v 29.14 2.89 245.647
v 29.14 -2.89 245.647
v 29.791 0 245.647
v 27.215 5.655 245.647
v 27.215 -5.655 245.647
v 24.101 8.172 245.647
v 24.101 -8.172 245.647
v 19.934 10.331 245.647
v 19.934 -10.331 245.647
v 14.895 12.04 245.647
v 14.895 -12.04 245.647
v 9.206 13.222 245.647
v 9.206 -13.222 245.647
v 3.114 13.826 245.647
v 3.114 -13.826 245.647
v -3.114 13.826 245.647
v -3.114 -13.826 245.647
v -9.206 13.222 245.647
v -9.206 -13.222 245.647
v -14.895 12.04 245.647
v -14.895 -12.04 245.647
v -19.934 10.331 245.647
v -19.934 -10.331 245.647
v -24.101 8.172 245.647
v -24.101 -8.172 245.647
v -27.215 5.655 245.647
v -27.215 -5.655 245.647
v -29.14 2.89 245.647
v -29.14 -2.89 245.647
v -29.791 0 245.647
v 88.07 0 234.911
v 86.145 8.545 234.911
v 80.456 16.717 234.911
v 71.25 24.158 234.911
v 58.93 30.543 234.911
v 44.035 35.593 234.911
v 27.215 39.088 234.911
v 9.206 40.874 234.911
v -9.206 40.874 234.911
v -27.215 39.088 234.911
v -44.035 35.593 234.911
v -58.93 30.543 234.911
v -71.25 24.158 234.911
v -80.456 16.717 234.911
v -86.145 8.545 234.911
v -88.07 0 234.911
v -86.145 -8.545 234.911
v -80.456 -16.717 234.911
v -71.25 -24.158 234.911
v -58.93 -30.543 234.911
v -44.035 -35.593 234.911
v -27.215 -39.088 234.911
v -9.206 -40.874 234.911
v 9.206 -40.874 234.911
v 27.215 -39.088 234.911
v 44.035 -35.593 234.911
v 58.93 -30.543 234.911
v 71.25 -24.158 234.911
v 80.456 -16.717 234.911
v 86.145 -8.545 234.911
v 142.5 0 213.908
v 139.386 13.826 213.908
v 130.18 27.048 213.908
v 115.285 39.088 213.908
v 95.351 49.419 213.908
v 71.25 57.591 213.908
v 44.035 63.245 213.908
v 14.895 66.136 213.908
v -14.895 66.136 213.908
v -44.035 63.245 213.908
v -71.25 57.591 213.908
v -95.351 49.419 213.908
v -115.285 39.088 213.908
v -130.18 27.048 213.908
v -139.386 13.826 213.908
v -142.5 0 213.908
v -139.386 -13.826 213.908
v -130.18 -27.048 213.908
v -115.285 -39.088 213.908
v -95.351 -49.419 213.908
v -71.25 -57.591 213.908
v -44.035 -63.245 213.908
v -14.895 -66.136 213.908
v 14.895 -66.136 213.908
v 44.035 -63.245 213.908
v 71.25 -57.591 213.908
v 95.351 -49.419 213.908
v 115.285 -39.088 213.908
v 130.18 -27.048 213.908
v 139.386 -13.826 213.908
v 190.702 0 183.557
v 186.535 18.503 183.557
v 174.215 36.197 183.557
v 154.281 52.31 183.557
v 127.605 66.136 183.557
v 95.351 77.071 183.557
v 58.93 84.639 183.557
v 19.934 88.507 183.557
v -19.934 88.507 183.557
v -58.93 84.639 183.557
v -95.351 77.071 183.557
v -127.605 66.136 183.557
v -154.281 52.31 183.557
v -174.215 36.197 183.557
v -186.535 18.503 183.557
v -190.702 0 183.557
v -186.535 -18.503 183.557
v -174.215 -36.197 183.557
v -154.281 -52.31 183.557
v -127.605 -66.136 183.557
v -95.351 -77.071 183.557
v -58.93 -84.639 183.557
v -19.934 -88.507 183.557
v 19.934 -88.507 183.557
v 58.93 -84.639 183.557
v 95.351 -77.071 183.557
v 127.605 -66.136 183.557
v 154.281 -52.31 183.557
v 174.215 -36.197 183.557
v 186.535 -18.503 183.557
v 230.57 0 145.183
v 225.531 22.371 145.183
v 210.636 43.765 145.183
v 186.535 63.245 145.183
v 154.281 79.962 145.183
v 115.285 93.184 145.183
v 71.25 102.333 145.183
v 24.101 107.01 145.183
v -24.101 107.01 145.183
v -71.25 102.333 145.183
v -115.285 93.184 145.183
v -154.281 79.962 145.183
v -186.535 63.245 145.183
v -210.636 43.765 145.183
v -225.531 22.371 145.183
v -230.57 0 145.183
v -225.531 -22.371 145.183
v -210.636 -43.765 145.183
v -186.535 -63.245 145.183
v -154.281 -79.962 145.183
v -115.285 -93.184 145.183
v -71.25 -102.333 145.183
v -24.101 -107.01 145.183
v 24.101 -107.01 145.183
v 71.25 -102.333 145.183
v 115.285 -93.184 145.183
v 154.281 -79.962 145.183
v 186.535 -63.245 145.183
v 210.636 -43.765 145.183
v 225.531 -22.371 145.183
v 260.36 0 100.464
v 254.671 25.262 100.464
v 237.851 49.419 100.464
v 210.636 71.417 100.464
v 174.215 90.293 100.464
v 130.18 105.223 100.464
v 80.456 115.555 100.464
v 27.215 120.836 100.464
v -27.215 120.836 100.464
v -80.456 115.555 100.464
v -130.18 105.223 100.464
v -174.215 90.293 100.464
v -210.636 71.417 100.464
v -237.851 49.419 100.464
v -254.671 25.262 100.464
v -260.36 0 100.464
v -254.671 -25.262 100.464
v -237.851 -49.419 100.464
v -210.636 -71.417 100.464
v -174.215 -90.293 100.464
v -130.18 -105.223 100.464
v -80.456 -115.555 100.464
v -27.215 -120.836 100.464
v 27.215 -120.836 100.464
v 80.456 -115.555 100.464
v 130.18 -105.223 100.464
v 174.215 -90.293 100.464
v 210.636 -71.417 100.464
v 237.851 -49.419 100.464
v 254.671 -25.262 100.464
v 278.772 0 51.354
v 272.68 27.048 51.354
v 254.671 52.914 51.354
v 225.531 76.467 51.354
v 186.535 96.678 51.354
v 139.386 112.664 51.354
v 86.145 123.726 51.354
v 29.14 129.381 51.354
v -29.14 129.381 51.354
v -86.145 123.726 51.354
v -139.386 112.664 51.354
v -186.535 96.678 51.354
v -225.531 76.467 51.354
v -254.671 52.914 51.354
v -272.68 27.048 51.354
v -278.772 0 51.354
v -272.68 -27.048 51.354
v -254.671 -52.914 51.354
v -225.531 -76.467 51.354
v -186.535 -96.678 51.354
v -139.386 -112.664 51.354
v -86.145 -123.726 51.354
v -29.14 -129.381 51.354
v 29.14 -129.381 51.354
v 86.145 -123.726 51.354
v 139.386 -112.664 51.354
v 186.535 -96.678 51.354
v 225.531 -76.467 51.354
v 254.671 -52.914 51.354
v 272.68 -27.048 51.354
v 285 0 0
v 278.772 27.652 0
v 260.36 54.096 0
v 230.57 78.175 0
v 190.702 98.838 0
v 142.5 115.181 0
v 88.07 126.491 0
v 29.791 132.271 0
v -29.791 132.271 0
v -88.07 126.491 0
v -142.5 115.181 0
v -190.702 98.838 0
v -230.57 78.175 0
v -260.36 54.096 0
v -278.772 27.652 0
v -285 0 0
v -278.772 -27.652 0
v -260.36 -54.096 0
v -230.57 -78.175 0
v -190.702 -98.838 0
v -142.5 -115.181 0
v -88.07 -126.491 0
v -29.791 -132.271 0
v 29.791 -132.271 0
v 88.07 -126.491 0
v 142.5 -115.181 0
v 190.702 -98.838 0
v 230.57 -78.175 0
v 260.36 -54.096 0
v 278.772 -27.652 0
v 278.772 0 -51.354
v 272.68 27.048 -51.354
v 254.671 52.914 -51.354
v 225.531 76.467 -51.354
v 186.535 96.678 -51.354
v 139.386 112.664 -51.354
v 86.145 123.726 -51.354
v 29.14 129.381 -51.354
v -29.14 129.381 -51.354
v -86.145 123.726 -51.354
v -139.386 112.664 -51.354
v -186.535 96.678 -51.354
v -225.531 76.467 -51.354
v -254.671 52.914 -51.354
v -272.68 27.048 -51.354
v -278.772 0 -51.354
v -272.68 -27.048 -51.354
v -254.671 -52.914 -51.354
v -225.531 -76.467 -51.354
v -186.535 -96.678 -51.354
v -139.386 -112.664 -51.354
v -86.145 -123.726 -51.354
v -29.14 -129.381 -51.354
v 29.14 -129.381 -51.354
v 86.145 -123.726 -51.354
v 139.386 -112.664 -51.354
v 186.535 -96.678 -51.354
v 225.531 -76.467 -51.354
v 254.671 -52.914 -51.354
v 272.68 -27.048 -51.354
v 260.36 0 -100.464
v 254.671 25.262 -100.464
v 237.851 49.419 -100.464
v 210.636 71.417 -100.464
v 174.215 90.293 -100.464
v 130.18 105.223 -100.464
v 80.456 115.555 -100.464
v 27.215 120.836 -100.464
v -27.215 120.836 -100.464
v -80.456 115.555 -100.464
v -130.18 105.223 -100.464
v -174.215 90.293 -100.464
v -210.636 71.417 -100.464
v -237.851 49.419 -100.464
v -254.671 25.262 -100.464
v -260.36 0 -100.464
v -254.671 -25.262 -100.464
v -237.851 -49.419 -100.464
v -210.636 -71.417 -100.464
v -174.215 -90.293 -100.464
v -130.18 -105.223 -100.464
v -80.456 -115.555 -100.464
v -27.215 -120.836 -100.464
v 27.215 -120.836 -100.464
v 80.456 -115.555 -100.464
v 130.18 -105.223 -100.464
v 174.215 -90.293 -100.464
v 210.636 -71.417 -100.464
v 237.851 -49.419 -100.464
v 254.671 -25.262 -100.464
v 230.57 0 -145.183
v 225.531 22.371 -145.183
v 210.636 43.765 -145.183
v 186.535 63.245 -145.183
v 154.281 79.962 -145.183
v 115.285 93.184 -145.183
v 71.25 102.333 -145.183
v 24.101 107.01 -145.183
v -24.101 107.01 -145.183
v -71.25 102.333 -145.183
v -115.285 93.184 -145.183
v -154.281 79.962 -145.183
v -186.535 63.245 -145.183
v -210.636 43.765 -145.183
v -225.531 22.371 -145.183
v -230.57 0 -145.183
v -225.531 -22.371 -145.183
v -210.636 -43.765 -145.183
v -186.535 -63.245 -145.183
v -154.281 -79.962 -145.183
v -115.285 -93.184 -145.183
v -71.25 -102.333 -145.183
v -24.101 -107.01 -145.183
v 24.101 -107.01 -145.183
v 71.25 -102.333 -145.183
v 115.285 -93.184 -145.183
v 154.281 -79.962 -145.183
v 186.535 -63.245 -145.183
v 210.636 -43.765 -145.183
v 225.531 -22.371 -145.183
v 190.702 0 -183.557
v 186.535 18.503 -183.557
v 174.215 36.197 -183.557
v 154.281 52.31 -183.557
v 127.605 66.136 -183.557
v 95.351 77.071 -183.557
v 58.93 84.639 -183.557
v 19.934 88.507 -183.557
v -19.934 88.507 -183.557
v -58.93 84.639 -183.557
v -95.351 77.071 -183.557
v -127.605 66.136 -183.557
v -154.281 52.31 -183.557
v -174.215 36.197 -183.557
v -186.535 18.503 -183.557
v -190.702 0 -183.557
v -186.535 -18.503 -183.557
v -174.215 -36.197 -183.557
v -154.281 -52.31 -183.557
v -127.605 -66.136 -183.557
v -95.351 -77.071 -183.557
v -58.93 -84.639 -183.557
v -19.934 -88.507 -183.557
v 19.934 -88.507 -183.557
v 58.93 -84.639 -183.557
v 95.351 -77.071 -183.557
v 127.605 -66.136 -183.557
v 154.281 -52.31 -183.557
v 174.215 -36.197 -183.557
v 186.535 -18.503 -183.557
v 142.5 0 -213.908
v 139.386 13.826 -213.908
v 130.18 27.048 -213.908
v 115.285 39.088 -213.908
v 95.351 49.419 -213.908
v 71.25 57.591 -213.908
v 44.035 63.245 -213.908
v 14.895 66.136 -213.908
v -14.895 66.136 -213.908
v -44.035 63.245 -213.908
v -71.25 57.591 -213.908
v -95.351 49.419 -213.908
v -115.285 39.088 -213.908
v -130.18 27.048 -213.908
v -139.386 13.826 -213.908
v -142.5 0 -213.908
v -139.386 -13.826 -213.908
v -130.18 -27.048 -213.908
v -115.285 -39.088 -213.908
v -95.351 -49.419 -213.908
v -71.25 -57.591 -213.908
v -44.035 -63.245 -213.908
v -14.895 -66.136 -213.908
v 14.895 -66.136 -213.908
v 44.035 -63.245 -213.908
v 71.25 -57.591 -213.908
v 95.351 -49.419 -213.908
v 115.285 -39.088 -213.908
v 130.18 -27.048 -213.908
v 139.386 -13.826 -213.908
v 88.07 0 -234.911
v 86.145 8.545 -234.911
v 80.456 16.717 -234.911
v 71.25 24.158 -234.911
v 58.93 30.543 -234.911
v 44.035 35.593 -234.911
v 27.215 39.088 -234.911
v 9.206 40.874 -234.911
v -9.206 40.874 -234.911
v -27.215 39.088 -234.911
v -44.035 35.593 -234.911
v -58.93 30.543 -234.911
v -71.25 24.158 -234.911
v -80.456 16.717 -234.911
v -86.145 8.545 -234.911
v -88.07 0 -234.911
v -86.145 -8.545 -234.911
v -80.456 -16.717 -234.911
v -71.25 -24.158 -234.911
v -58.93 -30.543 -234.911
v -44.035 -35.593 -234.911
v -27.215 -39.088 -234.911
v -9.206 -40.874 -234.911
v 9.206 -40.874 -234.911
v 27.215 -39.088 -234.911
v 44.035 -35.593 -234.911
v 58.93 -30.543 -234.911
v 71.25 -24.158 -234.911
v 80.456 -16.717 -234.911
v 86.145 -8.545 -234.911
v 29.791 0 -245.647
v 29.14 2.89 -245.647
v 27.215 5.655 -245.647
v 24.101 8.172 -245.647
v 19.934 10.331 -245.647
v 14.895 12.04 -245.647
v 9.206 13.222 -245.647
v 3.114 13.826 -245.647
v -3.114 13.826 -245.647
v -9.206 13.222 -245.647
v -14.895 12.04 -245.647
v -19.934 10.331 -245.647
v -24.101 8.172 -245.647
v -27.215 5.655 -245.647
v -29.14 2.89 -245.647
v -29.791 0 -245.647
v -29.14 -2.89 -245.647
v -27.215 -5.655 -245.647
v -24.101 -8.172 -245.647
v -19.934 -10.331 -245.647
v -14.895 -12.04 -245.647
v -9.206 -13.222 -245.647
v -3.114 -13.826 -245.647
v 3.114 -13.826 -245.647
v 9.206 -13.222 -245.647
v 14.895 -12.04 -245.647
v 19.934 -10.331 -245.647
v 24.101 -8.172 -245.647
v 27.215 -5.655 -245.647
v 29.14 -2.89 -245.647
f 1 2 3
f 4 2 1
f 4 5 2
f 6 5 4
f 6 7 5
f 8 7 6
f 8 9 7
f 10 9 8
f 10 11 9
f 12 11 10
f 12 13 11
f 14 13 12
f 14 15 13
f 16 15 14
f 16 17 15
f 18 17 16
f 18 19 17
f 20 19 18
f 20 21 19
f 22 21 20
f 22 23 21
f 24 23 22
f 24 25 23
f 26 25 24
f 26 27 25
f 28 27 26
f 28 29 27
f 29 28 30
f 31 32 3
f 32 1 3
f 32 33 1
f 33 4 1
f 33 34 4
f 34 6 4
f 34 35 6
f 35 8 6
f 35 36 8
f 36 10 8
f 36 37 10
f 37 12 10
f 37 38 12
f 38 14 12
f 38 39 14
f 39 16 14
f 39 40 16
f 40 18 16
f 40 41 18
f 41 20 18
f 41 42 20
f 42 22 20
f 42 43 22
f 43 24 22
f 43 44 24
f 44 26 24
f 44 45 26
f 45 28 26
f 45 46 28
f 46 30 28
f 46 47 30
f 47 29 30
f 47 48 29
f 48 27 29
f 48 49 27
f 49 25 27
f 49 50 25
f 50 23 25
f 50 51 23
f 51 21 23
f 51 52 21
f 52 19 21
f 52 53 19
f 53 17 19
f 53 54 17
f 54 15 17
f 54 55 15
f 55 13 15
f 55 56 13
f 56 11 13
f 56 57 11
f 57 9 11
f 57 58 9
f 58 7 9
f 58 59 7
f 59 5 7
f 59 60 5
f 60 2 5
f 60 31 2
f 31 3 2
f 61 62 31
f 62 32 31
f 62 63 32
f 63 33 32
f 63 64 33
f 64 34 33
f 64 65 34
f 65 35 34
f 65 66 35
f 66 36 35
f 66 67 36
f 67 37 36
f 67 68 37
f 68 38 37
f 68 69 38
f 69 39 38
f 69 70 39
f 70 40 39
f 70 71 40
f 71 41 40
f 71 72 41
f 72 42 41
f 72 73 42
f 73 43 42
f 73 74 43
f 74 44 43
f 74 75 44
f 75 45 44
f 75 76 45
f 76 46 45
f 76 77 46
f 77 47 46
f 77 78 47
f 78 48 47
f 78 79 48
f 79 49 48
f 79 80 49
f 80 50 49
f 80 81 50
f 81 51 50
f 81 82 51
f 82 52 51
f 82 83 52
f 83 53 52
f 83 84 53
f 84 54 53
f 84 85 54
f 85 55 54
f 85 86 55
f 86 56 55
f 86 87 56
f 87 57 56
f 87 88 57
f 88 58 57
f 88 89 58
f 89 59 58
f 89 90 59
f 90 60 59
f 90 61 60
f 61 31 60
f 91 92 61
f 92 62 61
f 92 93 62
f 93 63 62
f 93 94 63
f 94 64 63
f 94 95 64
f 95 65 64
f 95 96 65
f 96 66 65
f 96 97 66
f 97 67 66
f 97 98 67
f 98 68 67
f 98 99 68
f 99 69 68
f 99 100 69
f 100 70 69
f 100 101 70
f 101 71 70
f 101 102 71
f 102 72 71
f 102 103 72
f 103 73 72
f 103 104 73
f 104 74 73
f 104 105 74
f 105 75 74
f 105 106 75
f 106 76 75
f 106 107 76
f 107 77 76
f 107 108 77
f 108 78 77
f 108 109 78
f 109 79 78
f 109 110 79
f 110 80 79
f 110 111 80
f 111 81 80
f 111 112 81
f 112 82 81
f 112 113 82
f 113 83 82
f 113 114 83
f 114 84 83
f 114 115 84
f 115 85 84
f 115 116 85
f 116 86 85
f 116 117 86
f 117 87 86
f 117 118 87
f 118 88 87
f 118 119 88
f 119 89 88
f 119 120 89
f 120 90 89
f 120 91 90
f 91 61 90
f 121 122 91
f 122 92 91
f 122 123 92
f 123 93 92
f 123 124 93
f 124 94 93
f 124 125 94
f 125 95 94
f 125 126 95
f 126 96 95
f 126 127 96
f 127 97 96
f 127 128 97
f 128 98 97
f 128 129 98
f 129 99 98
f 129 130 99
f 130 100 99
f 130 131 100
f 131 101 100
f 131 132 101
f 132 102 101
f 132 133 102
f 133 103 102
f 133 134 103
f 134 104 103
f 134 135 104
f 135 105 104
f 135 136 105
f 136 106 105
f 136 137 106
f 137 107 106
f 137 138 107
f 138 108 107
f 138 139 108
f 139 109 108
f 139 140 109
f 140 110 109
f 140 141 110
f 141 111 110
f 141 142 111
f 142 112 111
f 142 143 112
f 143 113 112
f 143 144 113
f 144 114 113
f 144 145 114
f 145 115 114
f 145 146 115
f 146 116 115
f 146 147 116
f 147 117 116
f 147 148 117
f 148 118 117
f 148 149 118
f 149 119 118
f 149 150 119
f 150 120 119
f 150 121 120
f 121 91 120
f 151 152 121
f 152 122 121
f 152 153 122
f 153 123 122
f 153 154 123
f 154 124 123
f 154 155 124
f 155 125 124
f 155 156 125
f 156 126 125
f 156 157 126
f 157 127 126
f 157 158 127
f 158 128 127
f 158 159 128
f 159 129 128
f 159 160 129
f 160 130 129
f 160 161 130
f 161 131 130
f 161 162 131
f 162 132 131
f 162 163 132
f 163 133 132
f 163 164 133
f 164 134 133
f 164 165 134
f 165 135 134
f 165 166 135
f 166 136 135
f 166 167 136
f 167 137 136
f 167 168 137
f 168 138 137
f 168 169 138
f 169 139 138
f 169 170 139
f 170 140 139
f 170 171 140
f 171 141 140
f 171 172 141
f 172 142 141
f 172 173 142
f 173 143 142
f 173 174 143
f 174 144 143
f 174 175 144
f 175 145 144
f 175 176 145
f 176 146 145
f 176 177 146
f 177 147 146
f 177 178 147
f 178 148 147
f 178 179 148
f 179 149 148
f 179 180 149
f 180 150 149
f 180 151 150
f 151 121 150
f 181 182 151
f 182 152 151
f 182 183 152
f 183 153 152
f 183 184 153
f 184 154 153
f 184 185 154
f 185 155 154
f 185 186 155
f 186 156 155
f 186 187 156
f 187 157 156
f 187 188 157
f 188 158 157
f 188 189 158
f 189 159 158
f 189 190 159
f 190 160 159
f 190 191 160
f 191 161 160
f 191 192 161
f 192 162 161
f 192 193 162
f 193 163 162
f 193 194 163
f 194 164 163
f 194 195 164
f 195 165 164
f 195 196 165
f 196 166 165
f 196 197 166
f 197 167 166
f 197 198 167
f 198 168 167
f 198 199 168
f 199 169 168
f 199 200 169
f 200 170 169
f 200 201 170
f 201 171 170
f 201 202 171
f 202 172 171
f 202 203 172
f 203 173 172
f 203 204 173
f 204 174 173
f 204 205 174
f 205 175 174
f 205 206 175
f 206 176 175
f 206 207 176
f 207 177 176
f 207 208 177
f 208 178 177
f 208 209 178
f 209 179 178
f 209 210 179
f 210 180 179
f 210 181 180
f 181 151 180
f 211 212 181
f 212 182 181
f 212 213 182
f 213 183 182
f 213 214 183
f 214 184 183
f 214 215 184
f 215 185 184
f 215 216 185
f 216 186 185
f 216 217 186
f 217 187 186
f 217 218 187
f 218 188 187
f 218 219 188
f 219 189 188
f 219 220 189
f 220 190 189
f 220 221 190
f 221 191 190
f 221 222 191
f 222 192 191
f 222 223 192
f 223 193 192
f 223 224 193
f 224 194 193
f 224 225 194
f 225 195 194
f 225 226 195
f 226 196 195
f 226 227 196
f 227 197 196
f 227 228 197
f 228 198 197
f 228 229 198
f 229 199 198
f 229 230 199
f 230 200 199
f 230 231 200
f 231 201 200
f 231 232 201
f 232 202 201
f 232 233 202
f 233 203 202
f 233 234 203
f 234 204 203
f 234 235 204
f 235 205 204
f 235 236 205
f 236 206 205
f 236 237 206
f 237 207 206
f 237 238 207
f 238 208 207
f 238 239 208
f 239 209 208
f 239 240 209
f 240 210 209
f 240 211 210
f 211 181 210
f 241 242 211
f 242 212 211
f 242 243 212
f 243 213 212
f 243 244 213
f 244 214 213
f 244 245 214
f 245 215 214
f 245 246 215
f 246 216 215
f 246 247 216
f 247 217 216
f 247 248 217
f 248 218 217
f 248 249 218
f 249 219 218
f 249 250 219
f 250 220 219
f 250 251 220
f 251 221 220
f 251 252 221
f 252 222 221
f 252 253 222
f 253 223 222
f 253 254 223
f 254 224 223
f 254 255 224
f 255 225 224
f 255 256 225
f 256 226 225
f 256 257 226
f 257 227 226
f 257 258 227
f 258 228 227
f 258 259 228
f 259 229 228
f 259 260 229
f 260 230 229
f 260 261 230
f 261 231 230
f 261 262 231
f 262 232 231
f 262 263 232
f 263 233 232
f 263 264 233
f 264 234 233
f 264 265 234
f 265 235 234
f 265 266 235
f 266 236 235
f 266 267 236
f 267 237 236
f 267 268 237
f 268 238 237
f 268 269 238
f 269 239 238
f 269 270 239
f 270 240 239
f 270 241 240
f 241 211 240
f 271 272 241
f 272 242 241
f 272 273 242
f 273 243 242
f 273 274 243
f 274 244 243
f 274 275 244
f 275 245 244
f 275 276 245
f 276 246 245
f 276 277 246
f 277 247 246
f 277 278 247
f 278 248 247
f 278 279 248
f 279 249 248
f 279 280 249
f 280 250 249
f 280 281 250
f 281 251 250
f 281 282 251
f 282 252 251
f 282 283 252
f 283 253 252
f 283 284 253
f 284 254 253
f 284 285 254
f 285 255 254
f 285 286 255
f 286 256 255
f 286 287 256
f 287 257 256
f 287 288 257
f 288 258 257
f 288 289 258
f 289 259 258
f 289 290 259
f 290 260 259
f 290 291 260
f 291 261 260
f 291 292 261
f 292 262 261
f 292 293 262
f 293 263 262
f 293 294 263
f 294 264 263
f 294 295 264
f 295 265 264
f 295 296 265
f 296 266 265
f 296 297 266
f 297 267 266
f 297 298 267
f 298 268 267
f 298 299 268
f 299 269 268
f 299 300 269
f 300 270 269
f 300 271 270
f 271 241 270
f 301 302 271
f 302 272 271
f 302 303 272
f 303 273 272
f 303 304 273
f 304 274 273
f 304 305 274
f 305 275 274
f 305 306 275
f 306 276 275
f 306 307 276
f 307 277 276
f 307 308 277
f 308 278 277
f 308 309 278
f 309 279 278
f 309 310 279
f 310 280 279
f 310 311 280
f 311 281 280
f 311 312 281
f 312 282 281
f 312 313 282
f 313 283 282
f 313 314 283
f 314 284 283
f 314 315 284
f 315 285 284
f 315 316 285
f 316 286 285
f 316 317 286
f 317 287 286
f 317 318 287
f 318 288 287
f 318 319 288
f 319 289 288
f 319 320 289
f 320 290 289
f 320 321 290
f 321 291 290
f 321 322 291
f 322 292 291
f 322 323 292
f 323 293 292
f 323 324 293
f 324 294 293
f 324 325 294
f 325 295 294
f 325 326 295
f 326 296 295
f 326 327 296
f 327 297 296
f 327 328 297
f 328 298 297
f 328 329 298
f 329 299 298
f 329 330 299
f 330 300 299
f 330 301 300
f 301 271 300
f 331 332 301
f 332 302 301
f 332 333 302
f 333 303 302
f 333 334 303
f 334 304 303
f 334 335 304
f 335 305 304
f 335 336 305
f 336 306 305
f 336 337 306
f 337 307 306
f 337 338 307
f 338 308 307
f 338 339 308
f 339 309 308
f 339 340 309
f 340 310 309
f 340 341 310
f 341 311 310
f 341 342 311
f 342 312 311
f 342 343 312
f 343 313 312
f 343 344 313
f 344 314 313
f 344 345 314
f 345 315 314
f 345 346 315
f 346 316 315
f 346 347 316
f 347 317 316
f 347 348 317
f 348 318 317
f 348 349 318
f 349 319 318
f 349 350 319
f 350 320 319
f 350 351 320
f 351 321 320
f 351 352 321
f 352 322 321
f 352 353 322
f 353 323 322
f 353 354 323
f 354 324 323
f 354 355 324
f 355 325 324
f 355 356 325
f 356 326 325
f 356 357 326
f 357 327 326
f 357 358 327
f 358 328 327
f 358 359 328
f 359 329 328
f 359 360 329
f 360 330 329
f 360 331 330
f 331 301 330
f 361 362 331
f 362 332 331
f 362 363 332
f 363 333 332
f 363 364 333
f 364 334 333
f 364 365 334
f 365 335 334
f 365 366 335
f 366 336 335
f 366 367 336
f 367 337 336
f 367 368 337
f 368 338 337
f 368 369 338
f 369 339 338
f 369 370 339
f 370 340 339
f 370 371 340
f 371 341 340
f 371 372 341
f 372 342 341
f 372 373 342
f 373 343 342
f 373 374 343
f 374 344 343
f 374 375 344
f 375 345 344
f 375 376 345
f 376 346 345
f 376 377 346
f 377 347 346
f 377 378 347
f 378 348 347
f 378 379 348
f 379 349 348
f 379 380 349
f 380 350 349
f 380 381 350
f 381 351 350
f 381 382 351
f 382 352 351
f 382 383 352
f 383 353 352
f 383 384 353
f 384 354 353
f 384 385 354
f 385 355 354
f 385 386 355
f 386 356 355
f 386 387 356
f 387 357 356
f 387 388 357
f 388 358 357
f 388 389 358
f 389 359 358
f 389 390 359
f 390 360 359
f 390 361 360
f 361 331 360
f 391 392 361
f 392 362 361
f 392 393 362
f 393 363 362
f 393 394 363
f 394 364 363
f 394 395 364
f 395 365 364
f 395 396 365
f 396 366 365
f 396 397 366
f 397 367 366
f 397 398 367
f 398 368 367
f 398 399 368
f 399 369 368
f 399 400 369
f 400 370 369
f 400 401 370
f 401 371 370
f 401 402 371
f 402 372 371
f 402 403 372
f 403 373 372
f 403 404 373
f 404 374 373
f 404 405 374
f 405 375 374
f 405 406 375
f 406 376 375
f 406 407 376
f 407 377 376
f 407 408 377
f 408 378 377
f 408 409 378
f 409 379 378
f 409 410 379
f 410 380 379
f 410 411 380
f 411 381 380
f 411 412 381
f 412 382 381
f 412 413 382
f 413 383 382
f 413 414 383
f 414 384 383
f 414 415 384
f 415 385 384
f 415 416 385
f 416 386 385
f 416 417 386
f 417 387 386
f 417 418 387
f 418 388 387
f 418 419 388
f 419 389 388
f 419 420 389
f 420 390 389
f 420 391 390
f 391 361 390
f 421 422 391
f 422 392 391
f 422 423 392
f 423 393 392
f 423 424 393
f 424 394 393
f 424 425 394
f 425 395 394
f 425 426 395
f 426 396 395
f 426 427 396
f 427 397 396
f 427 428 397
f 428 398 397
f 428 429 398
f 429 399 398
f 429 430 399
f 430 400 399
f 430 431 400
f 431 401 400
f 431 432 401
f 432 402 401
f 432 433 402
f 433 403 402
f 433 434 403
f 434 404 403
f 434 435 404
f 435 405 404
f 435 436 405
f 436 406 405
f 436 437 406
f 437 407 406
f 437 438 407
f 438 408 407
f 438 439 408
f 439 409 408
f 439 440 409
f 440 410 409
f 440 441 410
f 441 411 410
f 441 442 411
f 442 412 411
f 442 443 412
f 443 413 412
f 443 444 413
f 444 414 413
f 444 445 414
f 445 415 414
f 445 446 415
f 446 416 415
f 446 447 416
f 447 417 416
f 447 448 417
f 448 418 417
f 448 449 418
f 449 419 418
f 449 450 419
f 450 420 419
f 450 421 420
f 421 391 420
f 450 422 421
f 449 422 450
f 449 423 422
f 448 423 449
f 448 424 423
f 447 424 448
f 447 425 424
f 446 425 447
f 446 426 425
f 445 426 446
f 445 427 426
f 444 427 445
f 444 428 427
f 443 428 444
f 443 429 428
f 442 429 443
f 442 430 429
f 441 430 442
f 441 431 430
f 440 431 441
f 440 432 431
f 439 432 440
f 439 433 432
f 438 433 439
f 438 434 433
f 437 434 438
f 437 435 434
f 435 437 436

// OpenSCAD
// Generated by SolidPython 1.0.1 on 2020-07-29 00:46:51


scale(v = [15, 7, 13]) {
	sphere(r = 19);
}
/***********************************************
*********      SolidPython code:      **********
************************************************
 
# import packages: SolidPython
from solid import *
from solid.utils import *
from itertools import chain, combinations, permutations


class Resize:

    def __init__(self, scad_file):
        self.scad_file = scad_file
        #self.scad_file = import_scad(scad_file)
        # cone/cylinder param:
        self.r1 = 0
        self.r2 = 0
        self.h = 0
        # rectangular prism param:
        self.w = 0
        self.l = 0
        # ellipse param:
        self.r = 0

    # import OpenScad code (file name corresponds to shape)


    # classify shape + parameters
    def assign(self, param1, param2, param3):
        if self.scad_file == 'cone.scad':
            self.r1 = param1
            self.r2 = param2
            self.h = param3
        elif self.scad_file == 'cylinder.scad':
            self.r1 = param1
            self.r2 = param2
            self.h = param3
        elif self.scad_file == 'rectangularPrism.scad':
            self.h = param1
            self.l = param2
            self.w = param3
        else:
            self.r = param1
            self.h = param2

    # resize parameters
    def iterate(self):
        x = range(3, 20, 2)
        i = 1
        if self.scad_file == 'cone.scad':
            tempList = list(permutations(x, 2))
            for temp in tempList:
                param1 = temp[0]
                param2 = temp[1]
                filepath = 'produced_scad_files/' + 'cone' + str(param1) + '_' + str(param2) + '_' + '.scad'
                scad_render_to_file(cylinder(h=param1, r1=param2, r2=0), filepath)

        elif self.scad_file == 'cylinder.scad':
            tempList = list(permutations(x, 3))
            for temp in tempList:
                param1 = temp[0]
                param2 = temp[1]
                filepath = 'produced_scad_files/' + 'cylinder' + str(param1) + '_' + str(param2) + '_' + '.scad'
                scad_render_to_file(cylinder(h=param1, r1=param2, r2=param2), filepath)

        elif self.scad_file == 'rectangularPrism.scad':
            tempList = list(permutations(x, 3))
            for temp in tempList:
                param1 = temp[0]
                param2 = temp[1]
                param3 = temp[2]
                filepath = 'produced_scad_files/' + 'rectangularPrism' + str(param1) + '_' + str(param2) + '_' + str(
                    param3) + '.scad'
                scad_render_to_file(cube(size=(param1, param2, param3)), filepath)

        elif self.scad_file == 'ellipse.scad':
            tempList = list(permutations(x, 4))
            for temp in tempList:
                param1 = temp[0]
                param2 = temp[1]
                param3 = temp[2]
                param4 = temp[3]
                filepath = 'produced_scad_files/' + 'ellipse' + str(param1) + '_' + str(param2) + '_' + str(param3) + '_' + str(param4) + '.scad'
                scad_render_to_file(scale([param1, param2, param3])(sphere(r=param4)), filepath)

    def render_to_scadfile(self):
        scad_render_to_file(scad, 'example.scad') 
 
************************************************/
